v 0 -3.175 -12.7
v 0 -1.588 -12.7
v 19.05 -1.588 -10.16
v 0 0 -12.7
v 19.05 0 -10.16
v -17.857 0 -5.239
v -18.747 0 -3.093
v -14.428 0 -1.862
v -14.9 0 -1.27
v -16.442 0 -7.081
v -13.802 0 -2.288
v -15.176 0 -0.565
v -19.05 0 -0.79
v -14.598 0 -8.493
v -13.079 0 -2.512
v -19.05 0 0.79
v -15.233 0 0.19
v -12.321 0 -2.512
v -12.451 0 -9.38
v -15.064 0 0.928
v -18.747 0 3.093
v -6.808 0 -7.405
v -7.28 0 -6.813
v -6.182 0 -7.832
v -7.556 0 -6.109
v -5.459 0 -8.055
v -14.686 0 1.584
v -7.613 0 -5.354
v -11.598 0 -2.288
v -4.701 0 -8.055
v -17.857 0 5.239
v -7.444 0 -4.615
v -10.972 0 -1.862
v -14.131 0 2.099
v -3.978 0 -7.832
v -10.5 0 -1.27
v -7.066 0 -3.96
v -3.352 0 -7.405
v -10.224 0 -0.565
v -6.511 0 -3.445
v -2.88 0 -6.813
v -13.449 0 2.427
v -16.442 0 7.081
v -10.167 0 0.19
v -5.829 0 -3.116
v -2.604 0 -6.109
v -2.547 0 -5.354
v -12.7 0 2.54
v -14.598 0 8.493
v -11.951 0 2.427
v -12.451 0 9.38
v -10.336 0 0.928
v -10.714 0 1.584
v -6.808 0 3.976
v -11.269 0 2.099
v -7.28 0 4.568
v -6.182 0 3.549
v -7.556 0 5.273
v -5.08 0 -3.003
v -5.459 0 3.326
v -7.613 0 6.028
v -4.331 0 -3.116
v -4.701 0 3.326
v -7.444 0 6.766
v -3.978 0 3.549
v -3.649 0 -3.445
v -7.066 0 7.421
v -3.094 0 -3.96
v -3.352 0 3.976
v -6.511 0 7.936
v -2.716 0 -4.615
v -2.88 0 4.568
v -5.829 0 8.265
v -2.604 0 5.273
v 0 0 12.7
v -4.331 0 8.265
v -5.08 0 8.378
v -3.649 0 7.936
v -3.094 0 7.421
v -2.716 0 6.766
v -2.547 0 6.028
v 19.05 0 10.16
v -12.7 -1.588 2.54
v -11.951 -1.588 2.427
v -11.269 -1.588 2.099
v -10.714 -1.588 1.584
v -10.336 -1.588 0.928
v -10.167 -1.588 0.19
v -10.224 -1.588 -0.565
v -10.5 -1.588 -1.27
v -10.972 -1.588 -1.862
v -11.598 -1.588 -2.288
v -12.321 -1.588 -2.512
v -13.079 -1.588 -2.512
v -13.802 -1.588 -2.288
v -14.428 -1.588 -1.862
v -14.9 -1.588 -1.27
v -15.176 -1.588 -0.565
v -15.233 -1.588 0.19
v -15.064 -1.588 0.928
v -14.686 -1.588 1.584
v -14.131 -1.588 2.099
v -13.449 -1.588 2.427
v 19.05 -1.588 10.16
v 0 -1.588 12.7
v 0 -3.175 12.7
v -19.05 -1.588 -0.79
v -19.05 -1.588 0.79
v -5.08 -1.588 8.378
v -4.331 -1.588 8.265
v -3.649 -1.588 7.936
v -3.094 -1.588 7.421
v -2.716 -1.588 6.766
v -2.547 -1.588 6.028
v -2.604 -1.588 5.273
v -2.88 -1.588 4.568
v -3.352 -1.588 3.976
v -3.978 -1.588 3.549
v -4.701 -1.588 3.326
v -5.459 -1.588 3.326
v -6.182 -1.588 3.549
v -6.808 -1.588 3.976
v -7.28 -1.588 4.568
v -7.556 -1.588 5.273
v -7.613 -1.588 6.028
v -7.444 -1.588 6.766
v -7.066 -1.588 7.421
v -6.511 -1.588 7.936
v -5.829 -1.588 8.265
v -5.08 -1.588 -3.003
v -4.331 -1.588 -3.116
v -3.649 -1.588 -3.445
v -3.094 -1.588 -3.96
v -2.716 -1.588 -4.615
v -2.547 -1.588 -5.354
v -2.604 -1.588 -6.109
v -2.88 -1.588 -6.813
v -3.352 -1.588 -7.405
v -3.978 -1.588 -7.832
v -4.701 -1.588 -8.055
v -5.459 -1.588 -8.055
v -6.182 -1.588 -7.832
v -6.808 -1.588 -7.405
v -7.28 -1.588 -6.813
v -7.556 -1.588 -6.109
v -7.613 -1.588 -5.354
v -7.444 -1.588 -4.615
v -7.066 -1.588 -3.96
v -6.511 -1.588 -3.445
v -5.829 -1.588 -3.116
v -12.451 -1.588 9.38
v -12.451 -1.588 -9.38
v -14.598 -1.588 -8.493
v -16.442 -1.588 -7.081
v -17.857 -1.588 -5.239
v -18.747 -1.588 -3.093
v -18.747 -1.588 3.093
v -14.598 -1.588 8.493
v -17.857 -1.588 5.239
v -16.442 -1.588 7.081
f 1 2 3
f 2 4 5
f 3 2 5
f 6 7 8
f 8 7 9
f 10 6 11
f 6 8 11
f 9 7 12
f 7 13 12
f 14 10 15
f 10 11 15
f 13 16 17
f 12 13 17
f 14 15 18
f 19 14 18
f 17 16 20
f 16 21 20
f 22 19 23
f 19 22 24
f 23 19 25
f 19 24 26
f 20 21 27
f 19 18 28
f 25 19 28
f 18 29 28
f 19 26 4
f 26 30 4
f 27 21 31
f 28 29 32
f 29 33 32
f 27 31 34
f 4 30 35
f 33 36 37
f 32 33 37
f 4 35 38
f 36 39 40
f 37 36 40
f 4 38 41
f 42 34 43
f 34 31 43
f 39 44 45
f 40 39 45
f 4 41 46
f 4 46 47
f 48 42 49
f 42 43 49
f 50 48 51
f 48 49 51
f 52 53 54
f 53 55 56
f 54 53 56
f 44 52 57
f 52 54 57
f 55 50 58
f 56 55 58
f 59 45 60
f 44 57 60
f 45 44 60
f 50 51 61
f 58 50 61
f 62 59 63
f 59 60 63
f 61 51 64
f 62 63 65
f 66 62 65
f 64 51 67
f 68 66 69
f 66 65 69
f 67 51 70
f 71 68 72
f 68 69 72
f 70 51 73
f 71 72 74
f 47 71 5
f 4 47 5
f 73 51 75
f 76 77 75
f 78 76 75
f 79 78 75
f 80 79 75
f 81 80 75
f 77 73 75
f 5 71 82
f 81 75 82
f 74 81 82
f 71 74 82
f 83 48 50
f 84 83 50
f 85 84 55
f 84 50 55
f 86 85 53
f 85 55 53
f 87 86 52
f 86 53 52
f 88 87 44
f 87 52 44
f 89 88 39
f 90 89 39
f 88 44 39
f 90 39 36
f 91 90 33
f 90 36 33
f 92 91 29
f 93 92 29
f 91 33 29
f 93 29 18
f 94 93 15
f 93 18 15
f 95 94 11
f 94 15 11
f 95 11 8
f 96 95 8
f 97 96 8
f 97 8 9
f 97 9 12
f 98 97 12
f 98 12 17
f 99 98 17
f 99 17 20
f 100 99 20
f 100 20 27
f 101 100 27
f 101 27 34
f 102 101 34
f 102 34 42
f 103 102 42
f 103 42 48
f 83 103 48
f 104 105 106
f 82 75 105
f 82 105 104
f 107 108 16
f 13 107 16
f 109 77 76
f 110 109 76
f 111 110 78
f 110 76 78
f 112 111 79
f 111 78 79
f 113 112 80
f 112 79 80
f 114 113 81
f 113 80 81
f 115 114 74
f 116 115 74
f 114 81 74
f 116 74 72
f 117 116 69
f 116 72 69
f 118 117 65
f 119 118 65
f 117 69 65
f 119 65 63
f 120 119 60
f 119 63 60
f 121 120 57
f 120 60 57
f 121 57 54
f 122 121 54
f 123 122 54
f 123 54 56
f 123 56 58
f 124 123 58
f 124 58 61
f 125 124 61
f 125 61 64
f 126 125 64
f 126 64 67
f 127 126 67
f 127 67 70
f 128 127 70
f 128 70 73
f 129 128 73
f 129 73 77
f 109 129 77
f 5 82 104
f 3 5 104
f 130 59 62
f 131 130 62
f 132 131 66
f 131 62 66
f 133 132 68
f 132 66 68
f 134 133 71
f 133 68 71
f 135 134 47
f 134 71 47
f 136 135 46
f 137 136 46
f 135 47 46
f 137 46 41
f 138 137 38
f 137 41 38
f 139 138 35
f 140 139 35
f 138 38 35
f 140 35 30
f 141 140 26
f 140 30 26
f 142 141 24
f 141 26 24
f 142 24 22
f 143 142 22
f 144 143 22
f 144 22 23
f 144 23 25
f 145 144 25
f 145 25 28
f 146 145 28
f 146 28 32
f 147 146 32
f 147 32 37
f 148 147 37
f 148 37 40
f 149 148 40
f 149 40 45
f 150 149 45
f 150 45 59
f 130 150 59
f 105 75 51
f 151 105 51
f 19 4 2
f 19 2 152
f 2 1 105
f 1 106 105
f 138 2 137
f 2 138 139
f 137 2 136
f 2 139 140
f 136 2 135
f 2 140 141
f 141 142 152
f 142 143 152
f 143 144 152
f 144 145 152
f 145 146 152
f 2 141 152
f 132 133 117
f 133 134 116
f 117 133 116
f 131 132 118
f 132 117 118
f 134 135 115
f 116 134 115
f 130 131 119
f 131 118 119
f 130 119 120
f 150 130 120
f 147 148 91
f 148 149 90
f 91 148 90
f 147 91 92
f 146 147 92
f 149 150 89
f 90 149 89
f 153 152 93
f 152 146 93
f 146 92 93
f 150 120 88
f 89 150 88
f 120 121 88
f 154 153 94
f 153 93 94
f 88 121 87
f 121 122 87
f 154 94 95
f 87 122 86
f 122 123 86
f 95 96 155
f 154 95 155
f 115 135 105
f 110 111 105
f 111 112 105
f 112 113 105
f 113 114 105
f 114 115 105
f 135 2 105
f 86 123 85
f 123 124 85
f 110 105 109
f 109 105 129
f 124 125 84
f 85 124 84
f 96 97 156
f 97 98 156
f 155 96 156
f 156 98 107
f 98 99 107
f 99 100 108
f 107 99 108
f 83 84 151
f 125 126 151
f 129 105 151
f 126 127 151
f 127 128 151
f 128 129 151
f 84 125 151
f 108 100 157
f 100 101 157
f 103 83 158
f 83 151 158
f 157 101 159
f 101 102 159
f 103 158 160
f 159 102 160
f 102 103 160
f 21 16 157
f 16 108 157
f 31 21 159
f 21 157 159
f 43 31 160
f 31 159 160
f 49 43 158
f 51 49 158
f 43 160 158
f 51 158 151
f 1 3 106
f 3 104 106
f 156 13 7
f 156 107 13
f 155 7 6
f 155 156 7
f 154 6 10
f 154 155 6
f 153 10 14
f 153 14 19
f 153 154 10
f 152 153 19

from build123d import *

# Parameters (mm, degrees)
BOSS_EXTRUDE1_DEPTH = 12.7
CUT_EXTRUDE1_DEPTH  = 25.4
CUT_EXTRUDE2_DEPTH  = 25.4
FILLET1_R           = 8.89
SKETCH4_R           = 2.54
CUT_EXTRUDE3_DEPTH  = 25.4


with BuildPart() as part:
    # Sketch1 → Boss-Extrude1 (new, symmetric)
    with BuildSketch(Plane.XY):
        Polygon((-19.05, 0), (19.05, 0), (19.05, -1.5875), (0, -3.175), (0, -1.5875), (-19.05, -1.5875), align=None)
    extrude(amount=BOSS_EXTRUDE1_DEPTH, both=True)

    # Sketch2 → Cut-Extrude1 (cut)
    with BuildSketch(Plane(origin=(0, 0, 0), x_dir=(1, 0, 0), z_dir=(0, 1, 0))):
        Polygon((0, 12.7), (19.05, 10.16), (19.05, 12.7), align=None)
    cut_extrude1 = extrude(amount=-CUT_EXTRUDE1_DEPTH, mode=Mode.SUBTRACT)

    # Mirror1: Cut-Extrude1 across plane
    add(cut_extrude1.mirror(Plane.XY), mode=Mode.SUBTRACT)

    # Sketch3 → Cut-Extrude2 (cut)
    with BuildSketch(Plane(origin=(0, 0, 0), x_dir=(1, 0, 0), z_dir=(0, 1, 0))):
        Polygon((0, 12.7), (-19.05, 7.62), (-19.05, 12.7), align=None)
    cut_extrude2 = extrude(amount=-CUT_EXTRUDE2_DEPTH, mode=Mode.SUBTRACT)

    # Mirror2: Cut-Extrude2 across plane
    add(cut_extrude2.mirror(Plane.XY), mode=Mode.SUBTRACT)

    # Fillet1
    fillet1_edges = [part.edges().sort_by_distance(p)[0] for p in [
        (-19.05, -0.79375, -7.62),
        (-19.05, -0.79375, 7.62),
    ]]
    fillet(fillet1_edges, radius=FILLET1_R)

    # Sketch4 → Cut-Extrude3 (cut)
    with BuildSketch(Plane(origin=(0, 0, 0), x_dir=(1, 0, 0), z_dir=(0, 1, 0))):
        with Locations(Location((-5.08, 5.543370255, 0), (0, 0, 270))):
            Circle(SKETCH4_R)
        with Locations(Location((-5.08, -5.837708499, 0), (0, 0, 270))):
            Circle(SKETCH4_R)
        with Locations(Location((-12.7, 0, 0), (0, 0, 270))):
            Circle(SKETCH4_R)
    extrude(amount=-CUT_EXTRUDE3_DEPTH, mode=Mode.SUBTRACT)


solid = part.part
